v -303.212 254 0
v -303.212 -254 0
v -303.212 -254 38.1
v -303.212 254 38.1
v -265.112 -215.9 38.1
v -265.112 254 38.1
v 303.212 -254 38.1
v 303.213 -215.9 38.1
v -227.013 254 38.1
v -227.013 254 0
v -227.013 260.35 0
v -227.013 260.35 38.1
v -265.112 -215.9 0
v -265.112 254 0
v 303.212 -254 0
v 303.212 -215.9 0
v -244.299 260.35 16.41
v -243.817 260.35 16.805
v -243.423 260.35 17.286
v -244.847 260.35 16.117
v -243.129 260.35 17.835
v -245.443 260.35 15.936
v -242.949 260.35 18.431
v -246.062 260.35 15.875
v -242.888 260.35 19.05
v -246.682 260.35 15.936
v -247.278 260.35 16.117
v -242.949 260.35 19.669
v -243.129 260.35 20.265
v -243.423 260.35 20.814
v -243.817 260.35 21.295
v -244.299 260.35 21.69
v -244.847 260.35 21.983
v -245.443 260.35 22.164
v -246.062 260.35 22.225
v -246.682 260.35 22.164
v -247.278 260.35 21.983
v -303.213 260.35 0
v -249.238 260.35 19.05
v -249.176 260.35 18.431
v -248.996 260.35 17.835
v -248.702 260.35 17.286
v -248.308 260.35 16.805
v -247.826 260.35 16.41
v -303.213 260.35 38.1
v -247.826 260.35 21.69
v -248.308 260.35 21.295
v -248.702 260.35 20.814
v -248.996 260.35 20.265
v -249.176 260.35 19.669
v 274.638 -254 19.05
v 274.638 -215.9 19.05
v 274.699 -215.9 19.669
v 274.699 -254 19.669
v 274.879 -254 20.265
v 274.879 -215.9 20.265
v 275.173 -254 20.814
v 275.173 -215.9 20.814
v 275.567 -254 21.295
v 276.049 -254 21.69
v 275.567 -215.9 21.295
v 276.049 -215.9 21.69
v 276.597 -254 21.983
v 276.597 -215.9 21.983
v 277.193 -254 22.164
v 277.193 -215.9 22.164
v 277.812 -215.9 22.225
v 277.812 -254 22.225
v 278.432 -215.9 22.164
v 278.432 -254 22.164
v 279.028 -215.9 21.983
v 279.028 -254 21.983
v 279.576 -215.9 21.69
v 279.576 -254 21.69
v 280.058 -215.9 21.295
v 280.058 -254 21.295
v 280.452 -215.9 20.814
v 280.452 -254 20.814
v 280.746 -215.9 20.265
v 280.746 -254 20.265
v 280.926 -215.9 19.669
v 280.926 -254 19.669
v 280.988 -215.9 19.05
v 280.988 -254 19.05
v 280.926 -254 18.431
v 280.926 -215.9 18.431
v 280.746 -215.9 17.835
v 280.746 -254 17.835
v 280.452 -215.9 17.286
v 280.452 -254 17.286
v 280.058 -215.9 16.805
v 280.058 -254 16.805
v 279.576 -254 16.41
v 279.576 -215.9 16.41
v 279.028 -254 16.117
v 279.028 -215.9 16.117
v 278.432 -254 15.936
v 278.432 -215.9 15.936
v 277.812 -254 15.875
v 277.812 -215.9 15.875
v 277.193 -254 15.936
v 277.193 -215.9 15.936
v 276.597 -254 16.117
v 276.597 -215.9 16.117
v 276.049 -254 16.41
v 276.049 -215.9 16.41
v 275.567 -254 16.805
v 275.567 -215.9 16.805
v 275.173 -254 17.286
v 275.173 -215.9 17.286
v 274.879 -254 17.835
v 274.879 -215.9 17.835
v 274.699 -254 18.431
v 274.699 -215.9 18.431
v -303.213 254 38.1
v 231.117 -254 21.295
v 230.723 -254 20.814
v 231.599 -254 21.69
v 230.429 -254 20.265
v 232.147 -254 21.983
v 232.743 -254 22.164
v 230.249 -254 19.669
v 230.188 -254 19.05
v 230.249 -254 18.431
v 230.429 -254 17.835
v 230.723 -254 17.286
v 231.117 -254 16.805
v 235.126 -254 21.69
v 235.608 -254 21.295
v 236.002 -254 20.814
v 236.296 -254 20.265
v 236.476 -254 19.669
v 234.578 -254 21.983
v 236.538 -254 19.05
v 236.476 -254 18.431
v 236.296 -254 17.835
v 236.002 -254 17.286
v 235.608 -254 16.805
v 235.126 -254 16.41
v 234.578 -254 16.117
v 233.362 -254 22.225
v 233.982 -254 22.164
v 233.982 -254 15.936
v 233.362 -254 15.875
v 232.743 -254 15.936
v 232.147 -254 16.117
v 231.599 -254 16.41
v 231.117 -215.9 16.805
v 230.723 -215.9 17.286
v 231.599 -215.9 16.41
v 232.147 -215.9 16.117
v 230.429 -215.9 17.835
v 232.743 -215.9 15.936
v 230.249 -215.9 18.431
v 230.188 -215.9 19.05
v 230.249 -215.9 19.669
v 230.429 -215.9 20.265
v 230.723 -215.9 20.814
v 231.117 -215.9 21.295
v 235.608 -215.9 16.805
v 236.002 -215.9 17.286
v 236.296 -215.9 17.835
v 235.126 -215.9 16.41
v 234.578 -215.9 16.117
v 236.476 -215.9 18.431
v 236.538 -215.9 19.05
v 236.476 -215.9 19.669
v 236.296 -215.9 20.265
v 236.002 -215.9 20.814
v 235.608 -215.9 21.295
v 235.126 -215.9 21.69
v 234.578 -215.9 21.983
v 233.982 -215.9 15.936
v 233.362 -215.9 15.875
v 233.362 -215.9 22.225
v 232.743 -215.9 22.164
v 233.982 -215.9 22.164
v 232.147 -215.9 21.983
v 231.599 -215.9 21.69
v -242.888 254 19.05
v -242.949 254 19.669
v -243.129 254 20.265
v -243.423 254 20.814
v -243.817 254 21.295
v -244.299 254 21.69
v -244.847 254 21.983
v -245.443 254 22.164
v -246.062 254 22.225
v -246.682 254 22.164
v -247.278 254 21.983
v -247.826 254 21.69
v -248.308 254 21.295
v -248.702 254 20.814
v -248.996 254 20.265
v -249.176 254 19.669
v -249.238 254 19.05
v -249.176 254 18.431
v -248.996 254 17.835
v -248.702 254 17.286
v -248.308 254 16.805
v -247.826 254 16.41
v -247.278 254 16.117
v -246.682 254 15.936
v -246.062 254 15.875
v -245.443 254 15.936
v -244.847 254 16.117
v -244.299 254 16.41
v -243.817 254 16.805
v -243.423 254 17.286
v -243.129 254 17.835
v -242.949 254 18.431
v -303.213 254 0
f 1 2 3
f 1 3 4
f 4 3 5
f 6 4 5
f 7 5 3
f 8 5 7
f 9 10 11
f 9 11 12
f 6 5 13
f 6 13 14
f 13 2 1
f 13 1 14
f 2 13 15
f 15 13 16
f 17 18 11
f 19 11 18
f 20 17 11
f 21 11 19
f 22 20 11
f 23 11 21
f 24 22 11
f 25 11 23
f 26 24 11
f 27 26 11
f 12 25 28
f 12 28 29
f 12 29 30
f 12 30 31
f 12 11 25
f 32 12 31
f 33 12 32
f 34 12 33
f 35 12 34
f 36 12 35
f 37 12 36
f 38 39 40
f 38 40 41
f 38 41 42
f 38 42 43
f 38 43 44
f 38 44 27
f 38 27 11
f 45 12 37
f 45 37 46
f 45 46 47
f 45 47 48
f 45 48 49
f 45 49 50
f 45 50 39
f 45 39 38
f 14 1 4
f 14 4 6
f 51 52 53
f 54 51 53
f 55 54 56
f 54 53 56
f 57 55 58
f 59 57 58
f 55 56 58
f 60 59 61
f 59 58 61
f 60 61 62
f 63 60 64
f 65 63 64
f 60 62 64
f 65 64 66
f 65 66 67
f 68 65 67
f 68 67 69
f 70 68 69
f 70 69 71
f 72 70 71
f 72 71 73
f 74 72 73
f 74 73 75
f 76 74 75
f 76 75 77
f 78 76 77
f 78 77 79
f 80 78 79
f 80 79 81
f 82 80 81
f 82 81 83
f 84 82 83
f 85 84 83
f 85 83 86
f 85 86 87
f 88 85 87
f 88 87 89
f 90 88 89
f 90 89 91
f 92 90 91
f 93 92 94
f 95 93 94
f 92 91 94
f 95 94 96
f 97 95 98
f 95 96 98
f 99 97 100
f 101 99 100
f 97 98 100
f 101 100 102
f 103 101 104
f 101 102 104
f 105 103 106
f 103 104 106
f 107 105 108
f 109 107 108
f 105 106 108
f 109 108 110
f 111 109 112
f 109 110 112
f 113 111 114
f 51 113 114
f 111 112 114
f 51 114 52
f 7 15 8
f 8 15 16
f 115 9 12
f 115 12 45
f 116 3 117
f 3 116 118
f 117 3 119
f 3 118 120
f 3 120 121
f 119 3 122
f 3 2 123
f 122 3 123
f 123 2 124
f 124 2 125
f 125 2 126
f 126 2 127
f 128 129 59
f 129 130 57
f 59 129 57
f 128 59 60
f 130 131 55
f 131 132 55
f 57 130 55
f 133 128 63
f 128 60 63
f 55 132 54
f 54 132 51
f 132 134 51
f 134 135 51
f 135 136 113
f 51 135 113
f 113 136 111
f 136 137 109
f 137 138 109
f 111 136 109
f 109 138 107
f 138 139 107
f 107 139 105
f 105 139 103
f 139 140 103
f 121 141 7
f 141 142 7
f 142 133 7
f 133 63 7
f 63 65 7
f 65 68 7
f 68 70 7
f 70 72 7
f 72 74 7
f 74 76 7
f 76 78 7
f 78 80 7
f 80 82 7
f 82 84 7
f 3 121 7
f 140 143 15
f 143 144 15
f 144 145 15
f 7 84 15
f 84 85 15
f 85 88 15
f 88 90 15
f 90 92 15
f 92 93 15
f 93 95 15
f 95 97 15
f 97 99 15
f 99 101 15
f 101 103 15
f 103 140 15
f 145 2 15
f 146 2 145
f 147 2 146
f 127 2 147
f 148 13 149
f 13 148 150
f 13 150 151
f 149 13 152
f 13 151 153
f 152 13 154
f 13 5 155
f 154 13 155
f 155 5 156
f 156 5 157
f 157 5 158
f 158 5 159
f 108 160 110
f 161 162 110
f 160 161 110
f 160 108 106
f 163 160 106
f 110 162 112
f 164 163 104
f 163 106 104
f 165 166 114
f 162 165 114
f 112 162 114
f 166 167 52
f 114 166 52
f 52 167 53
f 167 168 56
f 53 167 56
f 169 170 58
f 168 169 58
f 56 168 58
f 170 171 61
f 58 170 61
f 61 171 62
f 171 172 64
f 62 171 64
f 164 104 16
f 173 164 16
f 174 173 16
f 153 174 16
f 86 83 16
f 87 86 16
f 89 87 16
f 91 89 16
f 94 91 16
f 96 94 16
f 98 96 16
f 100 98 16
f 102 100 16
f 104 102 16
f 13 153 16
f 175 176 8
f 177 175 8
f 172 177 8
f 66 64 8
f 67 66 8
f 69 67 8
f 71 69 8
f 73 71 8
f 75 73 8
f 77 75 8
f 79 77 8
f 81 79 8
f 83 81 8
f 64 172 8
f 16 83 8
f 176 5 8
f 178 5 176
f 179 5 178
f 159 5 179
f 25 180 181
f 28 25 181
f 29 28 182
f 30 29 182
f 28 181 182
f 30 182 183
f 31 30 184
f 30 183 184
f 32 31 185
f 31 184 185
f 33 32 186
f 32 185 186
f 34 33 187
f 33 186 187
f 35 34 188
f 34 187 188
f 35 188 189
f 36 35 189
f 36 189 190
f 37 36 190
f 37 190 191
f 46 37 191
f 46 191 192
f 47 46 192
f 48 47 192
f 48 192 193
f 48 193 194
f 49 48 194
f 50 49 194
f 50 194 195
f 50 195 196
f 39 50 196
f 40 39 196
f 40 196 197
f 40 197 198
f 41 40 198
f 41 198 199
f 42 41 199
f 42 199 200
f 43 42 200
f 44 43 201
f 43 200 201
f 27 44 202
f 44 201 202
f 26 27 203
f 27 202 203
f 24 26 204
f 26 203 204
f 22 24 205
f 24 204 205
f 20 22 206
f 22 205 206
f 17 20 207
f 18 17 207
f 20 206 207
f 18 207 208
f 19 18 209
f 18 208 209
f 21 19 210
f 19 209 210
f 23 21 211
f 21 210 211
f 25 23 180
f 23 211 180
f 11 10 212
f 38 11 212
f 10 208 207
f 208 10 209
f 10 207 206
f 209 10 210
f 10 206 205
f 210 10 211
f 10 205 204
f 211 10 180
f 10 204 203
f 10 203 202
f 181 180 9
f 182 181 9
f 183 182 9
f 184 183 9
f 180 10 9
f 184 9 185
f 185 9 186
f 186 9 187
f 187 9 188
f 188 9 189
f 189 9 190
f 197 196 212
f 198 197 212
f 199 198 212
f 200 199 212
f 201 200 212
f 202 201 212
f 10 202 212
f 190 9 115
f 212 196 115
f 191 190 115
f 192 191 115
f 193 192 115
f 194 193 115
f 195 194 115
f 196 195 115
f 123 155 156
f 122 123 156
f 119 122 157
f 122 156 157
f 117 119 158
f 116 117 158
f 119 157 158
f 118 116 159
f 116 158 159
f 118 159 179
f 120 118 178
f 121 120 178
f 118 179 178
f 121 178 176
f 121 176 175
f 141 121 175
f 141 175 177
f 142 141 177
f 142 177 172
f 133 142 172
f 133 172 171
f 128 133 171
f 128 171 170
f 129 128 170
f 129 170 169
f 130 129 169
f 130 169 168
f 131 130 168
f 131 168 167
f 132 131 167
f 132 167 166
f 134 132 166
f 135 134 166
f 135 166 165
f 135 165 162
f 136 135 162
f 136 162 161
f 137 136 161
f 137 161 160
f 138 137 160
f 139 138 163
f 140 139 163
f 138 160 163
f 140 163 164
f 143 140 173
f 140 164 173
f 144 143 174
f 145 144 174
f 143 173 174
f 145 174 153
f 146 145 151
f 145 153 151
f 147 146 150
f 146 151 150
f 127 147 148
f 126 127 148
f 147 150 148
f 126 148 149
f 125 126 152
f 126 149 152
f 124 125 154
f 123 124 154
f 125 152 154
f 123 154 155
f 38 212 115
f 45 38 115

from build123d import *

# Parameters (mm, degrees)
F0_W     = 606.425
F0_H     = 508
F1_DEPTH = 38.1
F2_W     = 568.325
F2_H     = 469.9
F3_DEPTH = 38.101
F4_R     = 3.175
F5_DEPTH = 38.101
F6_W     = 76.2
F6_H     = 38.1
F7_DEPTH = 6.35
F8_R     = 3.175
F9_DEPTH = 6.351


with BuildPart() as f1:
    # F0 (on Top) → F1 (new body)
    with BuildSketch(Plane.XY):
        Rectangle(F0_W, F0_H)
    extrude(amount=F1_DEPTH)

    # F2 (on face) → F3 (cut, through all)
    with BuildSketch(Plane.XY.offset(38.1)):
        with Locations((19.05, 19.05)):
            Rectangle(F2_W, F2_H)
    extrude(amount=-F3_DEPTH, mode=Mode.SUBTRACT)

    # F4 (on face) → F5 (cut, through all)
    with BuildSketch(Plane(origin=(0, -215.9, 0), x_dir=(-1, 0, 0), z_dir=(0, 1, 0))):
        with Locations((-277.8125, 19.05)):
            Circle(F4_R)
        with Locations((-233.3625, 19.05)):
            Circle(F4_R)
    extrude(amount=-F5_DEPTH, mode=Mode.SUBTRACT)


with BuildPart() as f7:
    # F6 (on face) → F7 (new body)
    with BuildSketch(Plane(origin=(0, 254, 0), x_dir=(-1, 0, 0), z_dir=(0, 1, 0))):
        with Locations((265.1125, 19.05)):
            Rectangle(F6_W, F6_H)
    extrude(amount=F7_DEPTH)

    # F8 (on face) → F9 (cut, through all)
    with BuildSketch(Plane.XZ.offset(-254)):
        with Locations((-246.0625, 19.05)):
            Circle(F8_R)
    extrude(amount=-F9_DEPTH, mode=Mode.SUBTRACT)


solid = Compound([f1.part, f7.part])
